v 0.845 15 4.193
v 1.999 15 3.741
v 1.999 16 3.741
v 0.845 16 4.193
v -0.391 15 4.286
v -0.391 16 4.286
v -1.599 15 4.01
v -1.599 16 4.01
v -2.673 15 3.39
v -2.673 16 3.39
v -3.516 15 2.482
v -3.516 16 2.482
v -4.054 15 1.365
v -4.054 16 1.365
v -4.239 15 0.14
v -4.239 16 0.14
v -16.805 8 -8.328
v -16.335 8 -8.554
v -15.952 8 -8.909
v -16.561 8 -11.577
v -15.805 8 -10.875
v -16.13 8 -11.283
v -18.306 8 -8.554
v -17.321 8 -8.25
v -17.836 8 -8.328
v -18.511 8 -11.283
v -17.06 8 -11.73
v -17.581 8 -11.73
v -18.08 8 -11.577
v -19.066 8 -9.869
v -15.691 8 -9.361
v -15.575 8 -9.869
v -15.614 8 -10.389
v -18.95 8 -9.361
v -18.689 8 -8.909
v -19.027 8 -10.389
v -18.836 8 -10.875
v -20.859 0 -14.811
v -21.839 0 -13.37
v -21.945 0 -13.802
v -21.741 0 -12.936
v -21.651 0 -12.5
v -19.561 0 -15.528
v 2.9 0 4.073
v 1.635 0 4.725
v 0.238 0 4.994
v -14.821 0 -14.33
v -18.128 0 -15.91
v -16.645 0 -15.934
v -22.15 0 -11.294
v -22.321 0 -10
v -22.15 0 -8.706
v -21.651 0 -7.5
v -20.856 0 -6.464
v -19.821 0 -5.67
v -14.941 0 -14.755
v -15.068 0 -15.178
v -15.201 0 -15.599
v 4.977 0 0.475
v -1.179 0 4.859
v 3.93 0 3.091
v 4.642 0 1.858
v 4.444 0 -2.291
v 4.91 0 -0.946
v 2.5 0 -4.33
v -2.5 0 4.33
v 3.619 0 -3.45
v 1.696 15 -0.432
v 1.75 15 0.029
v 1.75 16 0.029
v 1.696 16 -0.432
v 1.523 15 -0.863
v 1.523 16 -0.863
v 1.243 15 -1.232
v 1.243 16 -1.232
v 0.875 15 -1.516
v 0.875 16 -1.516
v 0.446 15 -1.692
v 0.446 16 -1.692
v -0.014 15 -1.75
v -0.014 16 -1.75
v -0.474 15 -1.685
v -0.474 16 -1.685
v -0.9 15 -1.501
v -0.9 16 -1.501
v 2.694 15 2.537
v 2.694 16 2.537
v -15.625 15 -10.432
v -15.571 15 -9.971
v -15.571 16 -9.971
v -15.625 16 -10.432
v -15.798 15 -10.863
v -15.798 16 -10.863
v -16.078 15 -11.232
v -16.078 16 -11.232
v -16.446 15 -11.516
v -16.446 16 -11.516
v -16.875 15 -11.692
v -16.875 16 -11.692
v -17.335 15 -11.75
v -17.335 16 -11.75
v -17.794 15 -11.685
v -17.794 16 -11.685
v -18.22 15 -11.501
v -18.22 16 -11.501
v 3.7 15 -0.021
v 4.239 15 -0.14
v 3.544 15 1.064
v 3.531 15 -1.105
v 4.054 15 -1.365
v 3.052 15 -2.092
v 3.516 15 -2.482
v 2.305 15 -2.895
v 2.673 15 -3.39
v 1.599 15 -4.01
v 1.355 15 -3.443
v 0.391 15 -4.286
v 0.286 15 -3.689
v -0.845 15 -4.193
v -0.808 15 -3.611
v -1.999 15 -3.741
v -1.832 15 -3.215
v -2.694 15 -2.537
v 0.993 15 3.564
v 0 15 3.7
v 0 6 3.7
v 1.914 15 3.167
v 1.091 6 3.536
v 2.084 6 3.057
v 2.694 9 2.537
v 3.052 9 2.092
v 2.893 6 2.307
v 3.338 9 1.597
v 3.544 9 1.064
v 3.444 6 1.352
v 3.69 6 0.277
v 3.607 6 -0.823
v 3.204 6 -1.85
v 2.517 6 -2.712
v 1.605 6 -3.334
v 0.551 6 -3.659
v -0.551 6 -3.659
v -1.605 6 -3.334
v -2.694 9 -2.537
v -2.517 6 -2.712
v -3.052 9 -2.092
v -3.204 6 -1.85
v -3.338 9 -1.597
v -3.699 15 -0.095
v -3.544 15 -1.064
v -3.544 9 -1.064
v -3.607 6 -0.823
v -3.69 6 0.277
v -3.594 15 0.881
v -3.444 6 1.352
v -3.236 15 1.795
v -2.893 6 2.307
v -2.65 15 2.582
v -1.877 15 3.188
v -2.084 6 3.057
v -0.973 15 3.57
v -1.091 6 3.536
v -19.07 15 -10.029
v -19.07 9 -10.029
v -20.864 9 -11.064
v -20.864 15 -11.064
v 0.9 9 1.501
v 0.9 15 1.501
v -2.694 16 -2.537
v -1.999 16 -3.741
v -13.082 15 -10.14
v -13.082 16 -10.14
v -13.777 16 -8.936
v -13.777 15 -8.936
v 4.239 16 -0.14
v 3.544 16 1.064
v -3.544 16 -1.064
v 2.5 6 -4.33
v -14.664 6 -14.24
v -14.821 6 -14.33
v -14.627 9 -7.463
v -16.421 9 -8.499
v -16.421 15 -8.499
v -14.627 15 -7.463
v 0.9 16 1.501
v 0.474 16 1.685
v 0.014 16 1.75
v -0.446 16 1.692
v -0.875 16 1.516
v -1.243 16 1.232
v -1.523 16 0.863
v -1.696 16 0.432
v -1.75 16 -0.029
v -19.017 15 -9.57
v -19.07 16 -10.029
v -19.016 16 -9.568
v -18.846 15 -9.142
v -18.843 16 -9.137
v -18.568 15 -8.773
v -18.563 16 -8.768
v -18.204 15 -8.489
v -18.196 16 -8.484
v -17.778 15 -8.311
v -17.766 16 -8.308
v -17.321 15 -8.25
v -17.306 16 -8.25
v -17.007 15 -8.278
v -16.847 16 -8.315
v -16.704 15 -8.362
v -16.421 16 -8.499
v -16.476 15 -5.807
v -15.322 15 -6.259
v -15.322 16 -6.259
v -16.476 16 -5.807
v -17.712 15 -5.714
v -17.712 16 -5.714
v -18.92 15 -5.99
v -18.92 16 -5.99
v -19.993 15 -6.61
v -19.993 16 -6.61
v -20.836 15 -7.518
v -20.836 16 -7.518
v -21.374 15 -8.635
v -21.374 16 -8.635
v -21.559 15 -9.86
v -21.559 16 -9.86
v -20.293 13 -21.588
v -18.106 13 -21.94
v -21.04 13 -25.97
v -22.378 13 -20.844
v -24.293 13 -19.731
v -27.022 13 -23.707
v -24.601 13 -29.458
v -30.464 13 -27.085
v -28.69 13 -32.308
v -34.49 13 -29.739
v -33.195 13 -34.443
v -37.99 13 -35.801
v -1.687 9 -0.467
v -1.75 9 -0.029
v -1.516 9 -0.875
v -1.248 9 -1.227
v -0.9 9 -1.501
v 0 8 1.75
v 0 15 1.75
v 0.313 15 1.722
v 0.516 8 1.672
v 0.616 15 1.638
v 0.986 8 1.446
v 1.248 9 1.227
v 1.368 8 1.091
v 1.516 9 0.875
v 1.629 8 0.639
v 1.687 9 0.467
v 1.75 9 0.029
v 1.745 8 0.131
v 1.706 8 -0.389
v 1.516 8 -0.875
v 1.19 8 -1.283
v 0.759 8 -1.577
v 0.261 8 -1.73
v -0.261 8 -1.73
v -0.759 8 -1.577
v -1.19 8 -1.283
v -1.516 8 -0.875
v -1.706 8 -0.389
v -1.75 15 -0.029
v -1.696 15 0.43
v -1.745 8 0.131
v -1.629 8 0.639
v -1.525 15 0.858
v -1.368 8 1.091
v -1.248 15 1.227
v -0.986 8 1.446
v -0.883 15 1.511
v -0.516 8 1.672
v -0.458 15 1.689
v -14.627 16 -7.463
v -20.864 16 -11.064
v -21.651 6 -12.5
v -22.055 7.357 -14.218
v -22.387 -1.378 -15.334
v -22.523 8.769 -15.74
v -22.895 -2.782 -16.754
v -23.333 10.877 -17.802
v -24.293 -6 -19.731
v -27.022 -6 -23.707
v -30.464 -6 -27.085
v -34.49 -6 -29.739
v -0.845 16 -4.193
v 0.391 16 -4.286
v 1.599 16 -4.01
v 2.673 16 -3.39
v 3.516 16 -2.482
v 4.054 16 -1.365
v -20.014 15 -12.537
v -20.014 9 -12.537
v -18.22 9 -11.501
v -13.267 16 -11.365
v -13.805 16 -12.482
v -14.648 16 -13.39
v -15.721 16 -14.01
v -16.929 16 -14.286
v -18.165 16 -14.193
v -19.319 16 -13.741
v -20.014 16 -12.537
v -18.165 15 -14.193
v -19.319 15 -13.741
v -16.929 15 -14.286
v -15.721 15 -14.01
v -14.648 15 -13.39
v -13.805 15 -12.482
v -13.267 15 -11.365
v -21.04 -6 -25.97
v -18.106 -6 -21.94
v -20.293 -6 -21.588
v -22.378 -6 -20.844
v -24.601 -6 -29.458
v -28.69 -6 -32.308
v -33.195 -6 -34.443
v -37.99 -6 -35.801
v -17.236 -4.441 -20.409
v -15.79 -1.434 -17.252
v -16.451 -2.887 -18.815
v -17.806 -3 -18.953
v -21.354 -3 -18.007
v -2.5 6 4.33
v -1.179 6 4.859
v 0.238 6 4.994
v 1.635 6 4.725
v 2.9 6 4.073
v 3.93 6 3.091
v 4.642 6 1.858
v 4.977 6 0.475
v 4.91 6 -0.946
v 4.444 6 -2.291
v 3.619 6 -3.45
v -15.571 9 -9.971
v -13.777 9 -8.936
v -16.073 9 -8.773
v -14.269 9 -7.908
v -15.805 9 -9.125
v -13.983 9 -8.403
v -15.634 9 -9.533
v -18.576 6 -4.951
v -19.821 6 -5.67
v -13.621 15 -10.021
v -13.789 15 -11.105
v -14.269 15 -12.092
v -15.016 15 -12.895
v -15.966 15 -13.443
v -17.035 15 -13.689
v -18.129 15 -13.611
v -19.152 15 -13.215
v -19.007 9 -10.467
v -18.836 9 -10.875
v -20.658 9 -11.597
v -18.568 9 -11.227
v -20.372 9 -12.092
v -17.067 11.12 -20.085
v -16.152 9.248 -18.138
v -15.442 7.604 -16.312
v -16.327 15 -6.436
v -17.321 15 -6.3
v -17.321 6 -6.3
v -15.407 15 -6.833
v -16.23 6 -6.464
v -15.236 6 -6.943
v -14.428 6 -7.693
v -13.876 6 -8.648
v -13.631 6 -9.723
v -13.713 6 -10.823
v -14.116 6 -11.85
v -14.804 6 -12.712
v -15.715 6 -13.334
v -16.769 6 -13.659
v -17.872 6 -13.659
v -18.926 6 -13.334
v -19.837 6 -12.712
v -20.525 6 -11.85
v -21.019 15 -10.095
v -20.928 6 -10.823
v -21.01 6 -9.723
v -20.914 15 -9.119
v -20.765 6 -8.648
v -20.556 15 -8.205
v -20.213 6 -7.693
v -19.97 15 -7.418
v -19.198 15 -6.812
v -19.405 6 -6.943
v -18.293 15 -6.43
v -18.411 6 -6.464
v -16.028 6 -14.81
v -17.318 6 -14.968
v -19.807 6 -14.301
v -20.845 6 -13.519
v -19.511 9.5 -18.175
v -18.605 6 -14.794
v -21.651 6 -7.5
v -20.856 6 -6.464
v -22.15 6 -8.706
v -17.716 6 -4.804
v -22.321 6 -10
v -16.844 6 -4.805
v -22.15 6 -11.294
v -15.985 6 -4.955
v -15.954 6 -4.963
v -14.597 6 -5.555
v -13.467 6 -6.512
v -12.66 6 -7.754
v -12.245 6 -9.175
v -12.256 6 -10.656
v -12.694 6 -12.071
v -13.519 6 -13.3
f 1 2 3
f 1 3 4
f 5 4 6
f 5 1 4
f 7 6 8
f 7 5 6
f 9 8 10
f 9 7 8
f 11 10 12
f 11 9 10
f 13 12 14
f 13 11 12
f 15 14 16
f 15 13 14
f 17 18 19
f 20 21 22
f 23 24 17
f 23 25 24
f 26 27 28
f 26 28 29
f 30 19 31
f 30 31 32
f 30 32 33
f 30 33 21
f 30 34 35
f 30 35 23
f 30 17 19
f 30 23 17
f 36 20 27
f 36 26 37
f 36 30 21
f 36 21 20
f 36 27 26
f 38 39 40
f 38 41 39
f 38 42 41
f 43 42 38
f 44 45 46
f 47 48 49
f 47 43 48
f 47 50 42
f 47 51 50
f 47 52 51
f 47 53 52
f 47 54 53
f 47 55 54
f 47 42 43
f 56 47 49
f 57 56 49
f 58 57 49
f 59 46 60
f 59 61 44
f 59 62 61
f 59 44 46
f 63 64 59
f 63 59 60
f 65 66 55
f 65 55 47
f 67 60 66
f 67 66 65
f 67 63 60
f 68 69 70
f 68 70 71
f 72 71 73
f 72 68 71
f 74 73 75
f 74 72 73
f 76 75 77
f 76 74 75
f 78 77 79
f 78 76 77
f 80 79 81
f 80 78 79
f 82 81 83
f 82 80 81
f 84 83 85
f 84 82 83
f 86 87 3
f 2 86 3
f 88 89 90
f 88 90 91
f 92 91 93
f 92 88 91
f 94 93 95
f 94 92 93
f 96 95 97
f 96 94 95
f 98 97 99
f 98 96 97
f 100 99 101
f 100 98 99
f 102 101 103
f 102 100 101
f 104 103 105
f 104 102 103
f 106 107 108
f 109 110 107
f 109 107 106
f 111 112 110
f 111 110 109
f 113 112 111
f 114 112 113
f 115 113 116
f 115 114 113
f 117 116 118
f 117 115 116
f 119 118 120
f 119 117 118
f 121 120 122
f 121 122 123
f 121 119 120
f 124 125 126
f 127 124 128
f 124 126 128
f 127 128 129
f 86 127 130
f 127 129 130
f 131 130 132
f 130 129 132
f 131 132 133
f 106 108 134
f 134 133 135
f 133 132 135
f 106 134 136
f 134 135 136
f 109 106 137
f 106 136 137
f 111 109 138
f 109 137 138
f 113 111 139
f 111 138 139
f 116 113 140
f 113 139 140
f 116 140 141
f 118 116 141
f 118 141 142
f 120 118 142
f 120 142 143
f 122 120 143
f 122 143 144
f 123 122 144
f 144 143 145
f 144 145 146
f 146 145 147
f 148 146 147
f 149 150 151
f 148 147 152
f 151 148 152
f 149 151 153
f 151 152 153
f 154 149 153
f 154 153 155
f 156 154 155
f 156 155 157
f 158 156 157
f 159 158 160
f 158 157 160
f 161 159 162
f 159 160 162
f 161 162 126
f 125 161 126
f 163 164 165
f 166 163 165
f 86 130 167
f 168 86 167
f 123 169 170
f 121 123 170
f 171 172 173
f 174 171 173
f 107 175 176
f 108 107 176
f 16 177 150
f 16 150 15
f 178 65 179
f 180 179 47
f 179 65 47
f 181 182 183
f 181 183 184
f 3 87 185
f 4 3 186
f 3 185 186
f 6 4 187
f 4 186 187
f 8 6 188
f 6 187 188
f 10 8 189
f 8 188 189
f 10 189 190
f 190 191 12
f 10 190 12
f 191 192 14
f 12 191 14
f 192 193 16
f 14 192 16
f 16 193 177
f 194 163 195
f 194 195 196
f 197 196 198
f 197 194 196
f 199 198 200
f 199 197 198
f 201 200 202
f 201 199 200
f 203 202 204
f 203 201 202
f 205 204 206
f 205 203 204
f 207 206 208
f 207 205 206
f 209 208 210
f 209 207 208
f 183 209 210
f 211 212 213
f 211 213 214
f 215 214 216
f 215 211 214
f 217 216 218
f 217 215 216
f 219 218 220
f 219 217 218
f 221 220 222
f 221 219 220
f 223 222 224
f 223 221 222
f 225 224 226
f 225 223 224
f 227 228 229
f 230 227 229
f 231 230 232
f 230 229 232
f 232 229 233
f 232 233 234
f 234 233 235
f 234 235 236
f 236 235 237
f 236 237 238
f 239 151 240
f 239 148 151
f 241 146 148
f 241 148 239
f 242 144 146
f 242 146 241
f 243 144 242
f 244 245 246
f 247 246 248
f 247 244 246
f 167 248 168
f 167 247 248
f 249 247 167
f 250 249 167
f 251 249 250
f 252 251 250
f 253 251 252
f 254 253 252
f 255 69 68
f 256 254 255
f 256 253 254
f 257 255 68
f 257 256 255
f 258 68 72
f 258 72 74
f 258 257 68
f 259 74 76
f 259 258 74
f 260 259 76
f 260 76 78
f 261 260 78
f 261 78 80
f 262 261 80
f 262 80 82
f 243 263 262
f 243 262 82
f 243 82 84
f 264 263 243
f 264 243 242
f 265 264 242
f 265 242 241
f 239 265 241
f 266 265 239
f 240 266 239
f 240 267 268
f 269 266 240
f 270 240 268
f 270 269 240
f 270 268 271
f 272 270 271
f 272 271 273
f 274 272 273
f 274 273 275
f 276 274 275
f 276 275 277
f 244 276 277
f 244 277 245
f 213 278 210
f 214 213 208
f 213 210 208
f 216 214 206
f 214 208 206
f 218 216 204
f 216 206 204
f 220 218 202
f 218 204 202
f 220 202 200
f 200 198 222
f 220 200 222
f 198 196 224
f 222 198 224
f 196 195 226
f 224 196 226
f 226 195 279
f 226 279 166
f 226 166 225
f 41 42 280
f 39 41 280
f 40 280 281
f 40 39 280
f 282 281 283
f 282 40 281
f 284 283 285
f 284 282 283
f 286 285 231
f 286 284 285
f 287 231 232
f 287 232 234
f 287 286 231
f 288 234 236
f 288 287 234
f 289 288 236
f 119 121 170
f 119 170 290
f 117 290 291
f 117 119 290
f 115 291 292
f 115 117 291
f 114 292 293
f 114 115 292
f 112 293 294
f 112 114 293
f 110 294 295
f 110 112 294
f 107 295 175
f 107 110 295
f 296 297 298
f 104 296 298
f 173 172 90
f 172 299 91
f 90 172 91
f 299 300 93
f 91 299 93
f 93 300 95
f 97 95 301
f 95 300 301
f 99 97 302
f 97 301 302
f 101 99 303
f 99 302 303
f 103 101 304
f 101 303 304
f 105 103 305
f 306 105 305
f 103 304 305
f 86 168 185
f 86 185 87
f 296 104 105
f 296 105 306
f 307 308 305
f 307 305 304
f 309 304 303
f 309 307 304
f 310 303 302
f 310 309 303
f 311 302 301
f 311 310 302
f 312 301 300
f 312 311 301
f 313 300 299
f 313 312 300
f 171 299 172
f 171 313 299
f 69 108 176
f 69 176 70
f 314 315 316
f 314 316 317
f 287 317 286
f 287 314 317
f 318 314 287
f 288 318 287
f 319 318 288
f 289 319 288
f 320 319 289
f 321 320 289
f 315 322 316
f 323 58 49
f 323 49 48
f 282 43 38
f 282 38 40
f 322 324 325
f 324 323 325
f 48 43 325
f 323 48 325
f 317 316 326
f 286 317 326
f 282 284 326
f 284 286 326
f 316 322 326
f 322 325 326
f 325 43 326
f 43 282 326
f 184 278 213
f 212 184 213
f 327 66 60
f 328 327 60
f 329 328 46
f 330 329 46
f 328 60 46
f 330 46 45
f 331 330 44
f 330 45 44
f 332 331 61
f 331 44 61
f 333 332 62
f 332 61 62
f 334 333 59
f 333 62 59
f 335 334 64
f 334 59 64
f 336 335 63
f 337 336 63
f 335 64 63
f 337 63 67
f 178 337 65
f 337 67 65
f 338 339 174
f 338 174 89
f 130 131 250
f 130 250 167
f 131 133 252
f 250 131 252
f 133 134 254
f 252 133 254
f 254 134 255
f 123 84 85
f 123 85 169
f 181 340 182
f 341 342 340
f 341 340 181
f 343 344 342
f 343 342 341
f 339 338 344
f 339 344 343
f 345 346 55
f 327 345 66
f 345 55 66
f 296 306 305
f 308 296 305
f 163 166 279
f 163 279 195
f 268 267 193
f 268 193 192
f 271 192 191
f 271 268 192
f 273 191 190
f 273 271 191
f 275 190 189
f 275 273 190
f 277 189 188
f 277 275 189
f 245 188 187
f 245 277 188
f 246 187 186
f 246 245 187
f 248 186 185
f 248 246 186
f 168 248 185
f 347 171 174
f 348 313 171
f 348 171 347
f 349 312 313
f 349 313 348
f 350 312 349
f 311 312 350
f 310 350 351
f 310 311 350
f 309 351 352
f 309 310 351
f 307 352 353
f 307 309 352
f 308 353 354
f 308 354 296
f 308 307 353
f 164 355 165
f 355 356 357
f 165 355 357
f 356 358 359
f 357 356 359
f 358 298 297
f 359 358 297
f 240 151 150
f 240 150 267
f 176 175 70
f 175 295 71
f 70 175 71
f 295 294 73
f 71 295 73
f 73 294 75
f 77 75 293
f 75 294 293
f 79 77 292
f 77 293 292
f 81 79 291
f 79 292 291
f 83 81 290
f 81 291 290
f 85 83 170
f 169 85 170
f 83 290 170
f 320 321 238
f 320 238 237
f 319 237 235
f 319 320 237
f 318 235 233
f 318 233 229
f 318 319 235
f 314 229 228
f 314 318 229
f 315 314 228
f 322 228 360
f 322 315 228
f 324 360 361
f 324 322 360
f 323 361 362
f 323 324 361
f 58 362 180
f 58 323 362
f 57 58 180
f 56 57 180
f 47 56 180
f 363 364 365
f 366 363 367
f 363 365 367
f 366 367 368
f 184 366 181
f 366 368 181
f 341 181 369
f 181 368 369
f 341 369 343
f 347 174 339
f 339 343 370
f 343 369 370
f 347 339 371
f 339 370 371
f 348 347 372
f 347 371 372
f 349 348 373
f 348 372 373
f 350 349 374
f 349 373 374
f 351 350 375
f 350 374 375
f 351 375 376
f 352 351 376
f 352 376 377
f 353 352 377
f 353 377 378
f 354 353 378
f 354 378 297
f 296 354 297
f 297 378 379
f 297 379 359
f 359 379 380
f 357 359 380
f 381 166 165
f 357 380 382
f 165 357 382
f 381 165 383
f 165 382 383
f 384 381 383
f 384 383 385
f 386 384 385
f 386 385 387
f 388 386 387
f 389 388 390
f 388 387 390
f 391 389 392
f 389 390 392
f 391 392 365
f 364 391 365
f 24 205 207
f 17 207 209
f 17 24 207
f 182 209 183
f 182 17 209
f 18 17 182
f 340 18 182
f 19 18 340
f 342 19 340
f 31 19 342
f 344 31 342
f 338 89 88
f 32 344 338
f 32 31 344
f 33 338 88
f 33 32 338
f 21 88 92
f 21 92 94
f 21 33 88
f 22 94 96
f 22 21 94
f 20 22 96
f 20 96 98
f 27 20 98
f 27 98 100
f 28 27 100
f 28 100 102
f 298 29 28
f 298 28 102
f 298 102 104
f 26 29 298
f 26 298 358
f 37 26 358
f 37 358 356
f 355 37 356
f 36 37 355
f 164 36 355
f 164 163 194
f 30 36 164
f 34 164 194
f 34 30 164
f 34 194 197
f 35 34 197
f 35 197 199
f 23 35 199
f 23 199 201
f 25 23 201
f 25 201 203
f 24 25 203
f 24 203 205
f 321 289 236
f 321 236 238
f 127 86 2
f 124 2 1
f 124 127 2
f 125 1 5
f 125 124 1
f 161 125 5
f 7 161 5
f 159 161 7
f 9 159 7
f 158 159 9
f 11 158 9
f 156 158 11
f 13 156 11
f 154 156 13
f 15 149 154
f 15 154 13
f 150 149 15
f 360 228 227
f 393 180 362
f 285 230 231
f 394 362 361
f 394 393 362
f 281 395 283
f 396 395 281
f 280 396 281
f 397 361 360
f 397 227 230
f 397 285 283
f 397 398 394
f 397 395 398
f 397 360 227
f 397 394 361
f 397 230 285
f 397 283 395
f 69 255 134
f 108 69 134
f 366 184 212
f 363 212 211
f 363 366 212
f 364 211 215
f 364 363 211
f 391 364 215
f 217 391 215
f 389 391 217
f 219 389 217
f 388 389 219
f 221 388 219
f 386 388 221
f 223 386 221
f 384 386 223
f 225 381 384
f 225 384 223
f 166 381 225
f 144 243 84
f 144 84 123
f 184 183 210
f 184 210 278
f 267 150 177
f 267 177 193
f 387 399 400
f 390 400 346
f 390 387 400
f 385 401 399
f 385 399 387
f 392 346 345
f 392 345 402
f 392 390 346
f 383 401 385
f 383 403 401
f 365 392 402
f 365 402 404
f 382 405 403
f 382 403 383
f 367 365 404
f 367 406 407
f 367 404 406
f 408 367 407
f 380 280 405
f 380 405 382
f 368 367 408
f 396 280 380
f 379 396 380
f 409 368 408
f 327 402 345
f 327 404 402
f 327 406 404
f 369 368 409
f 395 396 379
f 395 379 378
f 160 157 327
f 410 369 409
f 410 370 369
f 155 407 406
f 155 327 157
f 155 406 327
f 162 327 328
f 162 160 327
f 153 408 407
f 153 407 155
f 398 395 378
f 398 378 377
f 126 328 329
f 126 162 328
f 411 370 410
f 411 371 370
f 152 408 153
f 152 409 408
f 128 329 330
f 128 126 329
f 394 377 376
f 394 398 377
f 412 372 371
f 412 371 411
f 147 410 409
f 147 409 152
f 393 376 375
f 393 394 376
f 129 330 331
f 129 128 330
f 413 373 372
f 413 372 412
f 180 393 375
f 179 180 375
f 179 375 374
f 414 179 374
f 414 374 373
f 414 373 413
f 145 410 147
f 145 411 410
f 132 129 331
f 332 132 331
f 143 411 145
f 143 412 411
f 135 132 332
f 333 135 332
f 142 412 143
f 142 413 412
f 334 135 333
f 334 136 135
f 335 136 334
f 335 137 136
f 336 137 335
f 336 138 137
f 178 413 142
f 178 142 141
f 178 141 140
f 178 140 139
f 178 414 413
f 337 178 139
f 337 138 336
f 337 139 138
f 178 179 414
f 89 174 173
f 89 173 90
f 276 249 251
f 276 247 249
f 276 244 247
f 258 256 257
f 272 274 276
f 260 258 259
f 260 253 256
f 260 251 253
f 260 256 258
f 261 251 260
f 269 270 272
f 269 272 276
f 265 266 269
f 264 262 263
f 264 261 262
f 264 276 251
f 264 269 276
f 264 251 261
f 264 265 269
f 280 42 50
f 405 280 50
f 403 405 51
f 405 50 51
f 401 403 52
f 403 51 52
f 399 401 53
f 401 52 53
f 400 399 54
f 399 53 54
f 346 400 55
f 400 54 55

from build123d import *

# Parameters (mm, degrees)
BOSS_EXTRUDE4_DEPTH       = 6
SKETCH1_10_R              = 3.7
SKETCH1_10_R_2            = 1.75
BOSS_EXTRUDE6_DEPTH       = 15
CUT_EXTRUDE1_START        = -6
CUT_EXTRUDE1_DEPTH        = 6
SKETCH6_R                 = 1.75
BOSS_EXTRUDE7_DEPTH       = 2
BOSS_EXTRUDE8_DEPTH       = 1
BOSS_EXTRUDE10_DEPTH      = 13
BOSS_EXTRUDE10_DEPTH_BACK = 6
CHAMFER2_SIZE             = 7
CUT_EXTRUDE2_DEPTH        = 1


with BuildPart() as part:
    # Sketch1 → Boss-Extrude4 (new body)
    with BuildSketch(Plane(origin=(0, 0, 0), x_dir=(1, 0, 0), z_dir=(0, 1, 0))):
        with BuildLine():
            Line((2.5, 4.330127019), (-14.820508076, 14.330127019))
            ThreePointArc((-14.820508076, 14.330127019), (-18.6051305, 14.794276156), (-21.650635095, 12.5))
            ThreePointArc((-21.650635095, 12.5), (-22.150137207, 8.705904774), (-19.820508076, 5.669872981))
            Line((-19.820508076, 5.669872981), (-2.5, -4.330127019))
            ThreePointArc((-2.5, -4.330127019), (4.330127019, -2.5), (2.5, 4.330127019))
        make_face()
    extrude(amount=BOSS_EXTRUDE4_DEPTH)

    # Sketch1<10> → Boss-Extrude6 (add)
    # profile 1 of 2: a face of its own
    with BuildSketch(Plane(origin=(0, 0, 0), x_dir=(1, 0, 0), z_dir=(0, 1, 0))):
        with Locations(Location((0, 0, 0), (0, 0, 270))):
            Circle(SKETCH1_10_R)
        with Locations(Location((0, 0, 0), (0, 0, 270))):
            Circle(SKETCH1_10_R_2, mode=Mode.SUBTRACT)
    # profile 2 of 2: a face of its own
    with BuildSketch(Plane(origin=(0, 0, 0), x_dir=(1, 0, 0), z_dir=(0, 1, 0))):
        with Locations(Location((-17.320508076, 10, 0), (0, 0, 270))):
            Circle(SKETCH1_10_R)
        with Locations(Location((-17.320508076, 10, 0), (0, 0, 270))):
            Circle(SKETCH1_10_R_2, mode=Mode.SUBTRACT)
    extrude(amount=BOSS_EXTRUDE6_DEPTH)

    # Sketch5 → Cut-Extrude1 (cut)
    with BuildSketch(Plane(origin=(0, 15, 0), x_dir=(1, 0, 0), z_dir=(0, 1, 0)).offset(CUT_EXTRUDE1_START)):
        with BuildLine():
            Line((-20.014101509, 12.536642351), (-18.220272206, 11.50097452))
            ThreePointArc((-18.220272206, 11.50097452), (-18.836052532, 10.875), (-19.070272206, 10.028731334))
            Line((-19.070272206, 10.028731334), (-20.864101509, 11.064399165))
            ThreePointArc((-20.864101509, 11.064399165), (-20.52480207, 11.85), (-20.014101509, 12.536642351))
        make_face()
        with BuildLine():
            Line((-13.776914643, 8.935600835), (-15.570743946, 9.971268666))
            ThreePointArc((-15.570743946, 9.971268666), (-15.804963619, 9.125), (-16.420743946, 8.49902548))
            Line((-16.420743946, 8.49902548), (-14.626914643, 7.463357649))
            ThreePointArc((-14.626914643, 7.463357649), (-14.116214082, 8.15), (-13.776914643, 8.935600835))
        make_face()
        with BuildLine():
            Line((2.693593433, -2.536642351), (0.89976413, -1.50097452))
            ThreePointArc((0.89976413, -1.50097452), (1.515544457, -0.875), (1.74976413, -0.028731334))
            Line((1.74976413, -0.028731334), (3.543593433, -1.064399165))
            ThreePointArc((3.543593433, -1.064399165), (3.204293994, -1.85), (2.693593433, -2.536642351))
        make_face()
        with BuildLine():
            Line((-3.543593433, 1.064399165), (-1.74976413, 0.028731334))
            ThreePointArc((-1.74976413, 0.028731334), (-1.515544457, 0.875), (-0.89976413, 1.50097452))
            Line((-0.89976413, 1.50097452), (-2.693593433, 2.536642351))
            ThreePointArc((-2.693593433, 2.536642351), (-3.204293994, 1.85), (-3.543593433, 1.064399165))
        make_face()
    extrude(amount=CUT_EXTRUDE1_DEPTH, mode=Mode.SUBTRACT)

    # Sketch6 → Boss-Extrude7 (add)
    with BuildSketch(Plane(origin=(0, 6, 0), x_dir=(1, 0, 0), z_dir=(0, 1, 0))):
        with Locations(Location((-17.320508076, 10, 0), (0, 0, 120.940718932))):
            Circle(SKETCH6_R)
        with Locations(Location((0, 0, 0), (0, 0, 90))):
            Circle(SKETCH6_R)
    extrude(amount=BOSS_EXTRUDE7_DEPTH)

    # Sketch8 → Boss-Extrude8 (add)
    with BuildSketch(Plane(origin=(0, 15, 0), x_dir=(1, 0, 0), z_dir=(0, 1, 0))):
        with BuildLine():
            Line((-18.220272206, 11.50097452), (-20.447114211, 12.786642351))
            ThreePointArc((-20.447114211, 12.786642351), (-15.161166743, 13.7400889), (-13.343901941, 8.685600835))
            Line((-13.343901941, 8.685600835), (-15.570743946, 9.971268666))
            ThreePointArc((-15.570743946, 9.971268666), (-16.445508076, 11.515544457), (-18.220272206, 11.50097452))
        make_face()
        with BuildLine():
            Line((-16.420743946, 8.49902548), (-14.193901941, 7.213357649))
            ThreePointArc((-14.193901941, 7.213357649), (-19.479849409, 6.2599111), (-21.297114211, 11.314399165))
            Line((-21.297114211, 11.314399165), (-19.070272206, 10.028731334))
            ThreePointArc((-19.070272206, 10.028731334), (-18.195508076, 8.484455543), (-16.420743946, 8.49902548))
        make_face()
        with BuildLine():
            Line((0.89976413, -1.50097452), (3.126606135, -2.786642351))
            ThreePointArc((3.126606135, -2.786642351), (-2.159341333, -3.7400889), (-3.976606135, 1.314399165))
            Line((-3.976606135, 1.314399165), (-1.74976413, 0.028731334))
            ThreePointArc((-1.74976413, 0.028731334), (-0.875, -1.515544457), (0.89976413, -1.50097452))
        make_face()
        with BuildLine():
            Line((-0.89976413, 1.50097452), (-3.126606135, 2.786642351))
            ThreePointArc((-3.126606135, 2.786642351), (2.159341333, 3.7400889), (3.976606135, -1.314399165))
            Line((3.976606135, -1.314399165), (1.74976413, -0.028731334))
            ThreePointArc((1.74976413, -0.028731334), (0.875, 1.515544457), (-0.89976413, 1.50097452))
        make_face()
    extrude(amount=BOSS_EXTRUDE8_DEPTH)

    # Sketch1<12> → Boss-Extrude10 (add, two sides: drawn at the far end of the back side and taken through both)
    with BuildSketch(Plane(origin=(0, 0, 0), x_dir=(1, 0, 0), z_dir=(0, 1, 0)).offset(-BOSS_EXTRUDE10_DEPTH_BACK)):
        with BuildLine():
            Line((-34.490381057, 29.739092363), (-37.990381057, 35.801270189))
            ThreePointArc((-37.990381057, 35.801270189), (-23.350583329, 28.362250924), (-14.820508076, 14.330127019))
            ThreePointArc((-14.820508076, 14.330127019), (-18.6051305, 14.794276156), (-21.650635095, 12.5))
            ThreePointArc((-21.650635095, 12.5), (-26.123146339, 22.569949107), (-34.490381057, 29.739092363))
        make_face()
    extrude(amount=BOSS_EXTRUDE10_DEPTH + BOSS_EXTRUDE10_DEPTH_BACK)

    # Chamfer2
    # the kernel refuses this chamfer: 7 mm, written as the material it takes off along each edge
    with BuildSketch(Plane(origin=(-17.287458299, -6, -9.876656552), x_dir=(0.2618523083710211, 0, 0.9651079569668709), z_dir=(-0.9651079569668709, 0, 0.2618523083710211))) as chamfer2_piece_1_section:
        Polygon((5.09109444 + CHAMFER2_SIZE, 0), (5.09109444, CHAMFER2_SIZE), (5.09109444, 0), align=None)
    chamfer2_piece_1 = revolve(axis=Axis((-17.287458299, -6, -9.876656552), (0, 1, 0)), revolution_arc=359.64, mode=Mode.PRIVATE)
    chamfer2_piece_1 = split(chamfer2_piece_1, bisect_by=Plane(origin=(-19.646446417, 0, -18.680520064), z_dir=(0, -1, 0)), keep=Keep.TOP, mode=Mode.PRIVATE)
    add(chamfer2_piece_1, mode=Mode.SUBTRACT)
    with BuildSketch(Plane(origin=(-17.287458299, 13, -9.876656552), x_dir=(0.2618523083710211, 0, 0.9651079569668709), z_dir=(-0.9651079569668709, 0, 0.2618523083710211))) as chamfer2_piece_2_section:
        Polygon((5.09109444 + CHAMFER2_SIZE, 0), (5.09109444, -CHAMFER2_SIZE), (5.09109444, 0), align=None)
    chamfer2_piece_2 = revolve(axis=Axis((-17.287458299, 13, -9.876656552), (0, 1, 0)), revolution_arc=359.64, mode=Mode.PRIVATE)
    chamfer2_piece_2 = split(chamfer2_piece_2, bisect_by=Plane(origin=(-19.516900024, 6, -18.197046345), z_dir=(0, 1, 0)), keep=Keep.TOP, mode=Mode.PRIVATE)
    add(chamfer2_piece_2, mode=Mode.SUBTRACT)

    # Sketch9 → Cut-Extrude2 (cut)
    with BuildSketch(Plane(origin=(0, 16, 0), x_dir=(1, 0, 0), z_dir=(0, 1, 0))):
        Polygon((-20.864101509, 11.064399165), (-21.559190629, 9.860469492), (-22.101511133, 10.173578381), (-21.406422012, 11.377508053), align=None)
        Polygon((-20.014101509, 12.536642351), (-19.319012388, 13.740572024), (-19.910294762, 14.081949062), (-20.605383883, 12.878019389), align=None)
        Polygon((-12.490543148, 9.79815347), (-13.081825522, 10.139530508), (-13.776914643, 8.935600835), (-13.185632268, 8.594223797), align=None)
        Polygon((-14.084594139, 7.15024876), (-14.626914643, 7.463357649), (-15.322003763, 6.259427976), (-14.77968326, 5.946319087), align=None)
        Polygon((-3.543593433, 1.064399165), (-4.238682554, -0.139530508), (-4.781003057, 0.173578381), (-4.085913936, 1.377508053), align=None)
        Polygon((-2.693593433, 2.536642351), (-1.998504312, 3.740572024), (-2.589786687, 4.081949062), (-3.284875807, 2.878019389), align=None)
        Polygon((4.829964928, -0.20184653), (4.238682554, 0.139530508), (3.543593433, -1.064399165), (4.134875807, -1.405776203), align=None)
        Polygon((3.235913936, -2.84975124), (2.693593433, -2.536642351), (1.998504312, -3.740572024), (2.540824816, -4.053680913), align=None)
    extrude(amount=-CUT_EXTRUDE2_DEPTH, mode=Mode.SUBTRACT)


solid = part.part
